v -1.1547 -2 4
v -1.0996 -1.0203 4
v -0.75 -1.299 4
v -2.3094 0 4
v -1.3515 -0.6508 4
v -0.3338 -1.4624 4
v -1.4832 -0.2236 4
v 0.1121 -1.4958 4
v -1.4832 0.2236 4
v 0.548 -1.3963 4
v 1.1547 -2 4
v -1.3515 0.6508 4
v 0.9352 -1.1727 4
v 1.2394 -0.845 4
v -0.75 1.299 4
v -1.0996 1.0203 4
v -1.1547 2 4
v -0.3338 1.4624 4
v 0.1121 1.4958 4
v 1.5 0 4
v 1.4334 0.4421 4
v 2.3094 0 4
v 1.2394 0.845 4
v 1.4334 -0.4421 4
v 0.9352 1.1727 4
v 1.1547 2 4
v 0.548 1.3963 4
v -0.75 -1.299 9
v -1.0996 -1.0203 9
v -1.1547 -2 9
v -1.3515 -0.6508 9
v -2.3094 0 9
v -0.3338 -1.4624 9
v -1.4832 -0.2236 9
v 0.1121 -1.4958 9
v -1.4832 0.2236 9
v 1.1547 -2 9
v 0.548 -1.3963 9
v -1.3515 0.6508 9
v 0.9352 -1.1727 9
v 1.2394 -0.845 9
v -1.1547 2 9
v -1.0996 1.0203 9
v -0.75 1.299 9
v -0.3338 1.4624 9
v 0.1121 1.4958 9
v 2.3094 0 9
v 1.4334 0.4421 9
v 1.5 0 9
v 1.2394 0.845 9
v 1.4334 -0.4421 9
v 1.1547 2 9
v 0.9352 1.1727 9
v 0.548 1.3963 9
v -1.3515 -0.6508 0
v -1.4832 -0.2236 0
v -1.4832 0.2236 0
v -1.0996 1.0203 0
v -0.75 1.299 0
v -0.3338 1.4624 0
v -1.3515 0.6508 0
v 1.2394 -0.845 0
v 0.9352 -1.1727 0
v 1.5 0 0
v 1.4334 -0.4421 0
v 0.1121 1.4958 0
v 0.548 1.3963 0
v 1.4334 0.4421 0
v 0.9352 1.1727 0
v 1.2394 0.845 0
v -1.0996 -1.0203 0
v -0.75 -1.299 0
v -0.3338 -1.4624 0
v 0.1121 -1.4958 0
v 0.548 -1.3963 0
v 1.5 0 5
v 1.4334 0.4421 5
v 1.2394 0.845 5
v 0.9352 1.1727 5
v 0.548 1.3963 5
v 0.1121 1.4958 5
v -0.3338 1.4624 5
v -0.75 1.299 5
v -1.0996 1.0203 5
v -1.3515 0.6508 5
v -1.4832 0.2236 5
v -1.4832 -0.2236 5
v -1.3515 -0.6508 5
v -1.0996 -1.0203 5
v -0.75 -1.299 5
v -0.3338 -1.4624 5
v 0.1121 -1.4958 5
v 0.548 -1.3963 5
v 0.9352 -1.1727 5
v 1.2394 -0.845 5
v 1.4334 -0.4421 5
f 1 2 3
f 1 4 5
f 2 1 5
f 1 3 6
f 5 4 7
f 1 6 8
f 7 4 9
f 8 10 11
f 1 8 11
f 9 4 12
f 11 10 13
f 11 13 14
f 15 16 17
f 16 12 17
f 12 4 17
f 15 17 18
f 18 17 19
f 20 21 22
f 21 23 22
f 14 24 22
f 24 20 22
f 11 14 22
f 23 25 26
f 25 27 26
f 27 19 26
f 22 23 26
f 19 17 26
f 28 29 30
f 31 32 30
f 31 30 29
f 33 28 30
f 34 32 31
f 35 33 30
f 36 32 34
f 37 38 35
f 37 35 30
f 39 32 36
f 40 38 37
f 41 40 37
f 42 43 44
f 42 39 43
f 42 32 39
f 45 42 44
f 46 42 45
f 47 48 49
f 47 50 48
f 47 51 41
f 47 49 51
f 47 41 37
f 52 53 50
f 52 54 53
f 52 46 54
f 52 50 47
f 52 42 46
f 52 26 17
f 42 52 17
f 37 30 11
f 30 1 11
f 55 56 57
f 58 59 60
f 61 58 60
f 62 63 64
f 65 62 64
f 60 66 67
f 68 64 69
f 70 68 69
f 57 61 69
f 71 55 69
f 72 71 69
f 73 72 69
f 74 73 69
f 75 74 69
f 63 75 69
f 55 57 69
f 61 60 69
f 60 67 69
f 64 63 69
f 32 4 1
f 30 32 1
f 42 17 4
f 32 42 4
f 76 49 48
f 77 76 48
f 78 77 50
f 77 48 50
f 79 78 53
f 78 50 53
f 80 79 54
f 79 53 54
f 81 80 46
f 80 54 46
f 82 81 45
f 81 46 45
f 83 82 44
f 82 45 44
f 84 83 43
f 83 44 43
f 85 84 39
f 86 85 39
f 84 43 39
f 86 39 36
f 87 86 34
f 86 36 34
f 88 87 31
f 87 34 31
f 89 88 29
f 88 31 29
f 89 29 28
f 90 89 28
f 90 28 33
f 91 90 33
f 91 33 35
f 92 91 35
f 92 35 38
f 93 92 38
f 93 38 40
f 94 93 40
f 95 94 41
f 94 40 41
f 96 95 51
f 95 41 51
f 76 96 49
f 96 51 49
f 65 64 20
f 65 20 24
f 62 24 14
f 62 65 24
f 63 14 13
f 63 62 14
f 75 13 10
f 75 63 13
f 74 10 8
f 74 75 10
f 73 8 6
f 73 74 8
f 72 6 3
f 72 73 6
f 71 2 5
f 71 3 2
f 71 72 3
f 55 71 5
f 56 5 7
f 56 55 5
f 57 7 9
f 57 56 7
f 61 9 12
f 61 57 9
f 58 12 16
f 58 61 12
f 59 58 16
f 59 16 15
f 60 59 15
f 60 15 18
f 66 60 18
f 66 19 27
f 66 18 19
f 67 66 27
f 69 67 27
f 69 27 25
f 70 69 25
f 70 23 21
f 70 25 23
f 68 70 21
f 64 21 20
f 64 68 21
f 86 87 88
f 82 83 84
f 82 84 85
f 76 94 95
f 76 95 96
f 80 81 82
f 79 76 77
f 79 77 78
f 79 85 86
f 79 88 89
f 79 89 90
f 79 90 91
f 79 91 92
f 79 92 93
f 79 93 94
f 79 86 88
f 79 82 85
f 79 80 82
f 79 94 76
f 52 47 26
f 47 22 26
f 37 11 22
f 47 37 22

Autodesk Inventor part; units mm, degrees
ref_plane "YZ Plane" through (0, 0, 0) normal (1, 0, 0) x (0, 1, 0)
ref_plane "XZ Plane" through (0, 0, 0) normal (0, 1, 0) x (-1, 0, 0)
ref_plane "XY Plane" through (0, 0, 0) normal (0, 0, 1) x (1, 0, 0)
sketch "Sketch1" plane through (0, 0, 0) normal (0, 0, 1) x (1, 0, 0)
  circle A0 centre (0, 0) radius 1.5
  dimension "d0" = 3
extrude "Extrusion1" add sketch "Sketch1" along normal blind 4
sketch "Sketch2" plane through (0, 0, 4) normal (0, 0, 1) x (1, 0, 0)
  circle A0 centre (0, 0) radius 1.5 construction
  line L0 (0.866, 1.5) -> (1.7321, 0) construction
  line L1 (1.7321, 0) -> (0.866, -1.5)
  line L2 (0.866, -1.5) -> (-0.866, -1.5)
  line L3 (-0.866, -1.5) -> (-1.7321, 0)
  line L4 (-1.7321, 0) -> (-0.866, 1.5)
  line L5 (-0.866, 1.5) -> (0.866, 1.5)
  line L6 (2.3094, 0) -> (1.1547, 2)
  line L7 (1.1547, 2) -> (-1.1547, 2)
  line L8 (-1.1547, 2) -> (-2.3094, 0)
  line L9 (-2.3094, 0) -> (-1.1547, -2)
  line L10 (-1.1547, -2) -> (1.1547, -2)
  line L11 (1.1547, -2) -> (2.3094, 0)
  point P0 (0, 1.5)
  dimension "d3" = 0.5
extrude "Extrusion2" add sketch "Sketch2" along normal blind 5
sketch "Sketch3" plane through (0, 0, 9) normal (0, 0, 1) x (1, 0, 0)
  circle A0 centre (0, 0) radius 1.5
  dimension "d6" = 3
extrude "Extrusion3" cut sketch "Sketch3" against normal blind 4
properties part number "piedino"
